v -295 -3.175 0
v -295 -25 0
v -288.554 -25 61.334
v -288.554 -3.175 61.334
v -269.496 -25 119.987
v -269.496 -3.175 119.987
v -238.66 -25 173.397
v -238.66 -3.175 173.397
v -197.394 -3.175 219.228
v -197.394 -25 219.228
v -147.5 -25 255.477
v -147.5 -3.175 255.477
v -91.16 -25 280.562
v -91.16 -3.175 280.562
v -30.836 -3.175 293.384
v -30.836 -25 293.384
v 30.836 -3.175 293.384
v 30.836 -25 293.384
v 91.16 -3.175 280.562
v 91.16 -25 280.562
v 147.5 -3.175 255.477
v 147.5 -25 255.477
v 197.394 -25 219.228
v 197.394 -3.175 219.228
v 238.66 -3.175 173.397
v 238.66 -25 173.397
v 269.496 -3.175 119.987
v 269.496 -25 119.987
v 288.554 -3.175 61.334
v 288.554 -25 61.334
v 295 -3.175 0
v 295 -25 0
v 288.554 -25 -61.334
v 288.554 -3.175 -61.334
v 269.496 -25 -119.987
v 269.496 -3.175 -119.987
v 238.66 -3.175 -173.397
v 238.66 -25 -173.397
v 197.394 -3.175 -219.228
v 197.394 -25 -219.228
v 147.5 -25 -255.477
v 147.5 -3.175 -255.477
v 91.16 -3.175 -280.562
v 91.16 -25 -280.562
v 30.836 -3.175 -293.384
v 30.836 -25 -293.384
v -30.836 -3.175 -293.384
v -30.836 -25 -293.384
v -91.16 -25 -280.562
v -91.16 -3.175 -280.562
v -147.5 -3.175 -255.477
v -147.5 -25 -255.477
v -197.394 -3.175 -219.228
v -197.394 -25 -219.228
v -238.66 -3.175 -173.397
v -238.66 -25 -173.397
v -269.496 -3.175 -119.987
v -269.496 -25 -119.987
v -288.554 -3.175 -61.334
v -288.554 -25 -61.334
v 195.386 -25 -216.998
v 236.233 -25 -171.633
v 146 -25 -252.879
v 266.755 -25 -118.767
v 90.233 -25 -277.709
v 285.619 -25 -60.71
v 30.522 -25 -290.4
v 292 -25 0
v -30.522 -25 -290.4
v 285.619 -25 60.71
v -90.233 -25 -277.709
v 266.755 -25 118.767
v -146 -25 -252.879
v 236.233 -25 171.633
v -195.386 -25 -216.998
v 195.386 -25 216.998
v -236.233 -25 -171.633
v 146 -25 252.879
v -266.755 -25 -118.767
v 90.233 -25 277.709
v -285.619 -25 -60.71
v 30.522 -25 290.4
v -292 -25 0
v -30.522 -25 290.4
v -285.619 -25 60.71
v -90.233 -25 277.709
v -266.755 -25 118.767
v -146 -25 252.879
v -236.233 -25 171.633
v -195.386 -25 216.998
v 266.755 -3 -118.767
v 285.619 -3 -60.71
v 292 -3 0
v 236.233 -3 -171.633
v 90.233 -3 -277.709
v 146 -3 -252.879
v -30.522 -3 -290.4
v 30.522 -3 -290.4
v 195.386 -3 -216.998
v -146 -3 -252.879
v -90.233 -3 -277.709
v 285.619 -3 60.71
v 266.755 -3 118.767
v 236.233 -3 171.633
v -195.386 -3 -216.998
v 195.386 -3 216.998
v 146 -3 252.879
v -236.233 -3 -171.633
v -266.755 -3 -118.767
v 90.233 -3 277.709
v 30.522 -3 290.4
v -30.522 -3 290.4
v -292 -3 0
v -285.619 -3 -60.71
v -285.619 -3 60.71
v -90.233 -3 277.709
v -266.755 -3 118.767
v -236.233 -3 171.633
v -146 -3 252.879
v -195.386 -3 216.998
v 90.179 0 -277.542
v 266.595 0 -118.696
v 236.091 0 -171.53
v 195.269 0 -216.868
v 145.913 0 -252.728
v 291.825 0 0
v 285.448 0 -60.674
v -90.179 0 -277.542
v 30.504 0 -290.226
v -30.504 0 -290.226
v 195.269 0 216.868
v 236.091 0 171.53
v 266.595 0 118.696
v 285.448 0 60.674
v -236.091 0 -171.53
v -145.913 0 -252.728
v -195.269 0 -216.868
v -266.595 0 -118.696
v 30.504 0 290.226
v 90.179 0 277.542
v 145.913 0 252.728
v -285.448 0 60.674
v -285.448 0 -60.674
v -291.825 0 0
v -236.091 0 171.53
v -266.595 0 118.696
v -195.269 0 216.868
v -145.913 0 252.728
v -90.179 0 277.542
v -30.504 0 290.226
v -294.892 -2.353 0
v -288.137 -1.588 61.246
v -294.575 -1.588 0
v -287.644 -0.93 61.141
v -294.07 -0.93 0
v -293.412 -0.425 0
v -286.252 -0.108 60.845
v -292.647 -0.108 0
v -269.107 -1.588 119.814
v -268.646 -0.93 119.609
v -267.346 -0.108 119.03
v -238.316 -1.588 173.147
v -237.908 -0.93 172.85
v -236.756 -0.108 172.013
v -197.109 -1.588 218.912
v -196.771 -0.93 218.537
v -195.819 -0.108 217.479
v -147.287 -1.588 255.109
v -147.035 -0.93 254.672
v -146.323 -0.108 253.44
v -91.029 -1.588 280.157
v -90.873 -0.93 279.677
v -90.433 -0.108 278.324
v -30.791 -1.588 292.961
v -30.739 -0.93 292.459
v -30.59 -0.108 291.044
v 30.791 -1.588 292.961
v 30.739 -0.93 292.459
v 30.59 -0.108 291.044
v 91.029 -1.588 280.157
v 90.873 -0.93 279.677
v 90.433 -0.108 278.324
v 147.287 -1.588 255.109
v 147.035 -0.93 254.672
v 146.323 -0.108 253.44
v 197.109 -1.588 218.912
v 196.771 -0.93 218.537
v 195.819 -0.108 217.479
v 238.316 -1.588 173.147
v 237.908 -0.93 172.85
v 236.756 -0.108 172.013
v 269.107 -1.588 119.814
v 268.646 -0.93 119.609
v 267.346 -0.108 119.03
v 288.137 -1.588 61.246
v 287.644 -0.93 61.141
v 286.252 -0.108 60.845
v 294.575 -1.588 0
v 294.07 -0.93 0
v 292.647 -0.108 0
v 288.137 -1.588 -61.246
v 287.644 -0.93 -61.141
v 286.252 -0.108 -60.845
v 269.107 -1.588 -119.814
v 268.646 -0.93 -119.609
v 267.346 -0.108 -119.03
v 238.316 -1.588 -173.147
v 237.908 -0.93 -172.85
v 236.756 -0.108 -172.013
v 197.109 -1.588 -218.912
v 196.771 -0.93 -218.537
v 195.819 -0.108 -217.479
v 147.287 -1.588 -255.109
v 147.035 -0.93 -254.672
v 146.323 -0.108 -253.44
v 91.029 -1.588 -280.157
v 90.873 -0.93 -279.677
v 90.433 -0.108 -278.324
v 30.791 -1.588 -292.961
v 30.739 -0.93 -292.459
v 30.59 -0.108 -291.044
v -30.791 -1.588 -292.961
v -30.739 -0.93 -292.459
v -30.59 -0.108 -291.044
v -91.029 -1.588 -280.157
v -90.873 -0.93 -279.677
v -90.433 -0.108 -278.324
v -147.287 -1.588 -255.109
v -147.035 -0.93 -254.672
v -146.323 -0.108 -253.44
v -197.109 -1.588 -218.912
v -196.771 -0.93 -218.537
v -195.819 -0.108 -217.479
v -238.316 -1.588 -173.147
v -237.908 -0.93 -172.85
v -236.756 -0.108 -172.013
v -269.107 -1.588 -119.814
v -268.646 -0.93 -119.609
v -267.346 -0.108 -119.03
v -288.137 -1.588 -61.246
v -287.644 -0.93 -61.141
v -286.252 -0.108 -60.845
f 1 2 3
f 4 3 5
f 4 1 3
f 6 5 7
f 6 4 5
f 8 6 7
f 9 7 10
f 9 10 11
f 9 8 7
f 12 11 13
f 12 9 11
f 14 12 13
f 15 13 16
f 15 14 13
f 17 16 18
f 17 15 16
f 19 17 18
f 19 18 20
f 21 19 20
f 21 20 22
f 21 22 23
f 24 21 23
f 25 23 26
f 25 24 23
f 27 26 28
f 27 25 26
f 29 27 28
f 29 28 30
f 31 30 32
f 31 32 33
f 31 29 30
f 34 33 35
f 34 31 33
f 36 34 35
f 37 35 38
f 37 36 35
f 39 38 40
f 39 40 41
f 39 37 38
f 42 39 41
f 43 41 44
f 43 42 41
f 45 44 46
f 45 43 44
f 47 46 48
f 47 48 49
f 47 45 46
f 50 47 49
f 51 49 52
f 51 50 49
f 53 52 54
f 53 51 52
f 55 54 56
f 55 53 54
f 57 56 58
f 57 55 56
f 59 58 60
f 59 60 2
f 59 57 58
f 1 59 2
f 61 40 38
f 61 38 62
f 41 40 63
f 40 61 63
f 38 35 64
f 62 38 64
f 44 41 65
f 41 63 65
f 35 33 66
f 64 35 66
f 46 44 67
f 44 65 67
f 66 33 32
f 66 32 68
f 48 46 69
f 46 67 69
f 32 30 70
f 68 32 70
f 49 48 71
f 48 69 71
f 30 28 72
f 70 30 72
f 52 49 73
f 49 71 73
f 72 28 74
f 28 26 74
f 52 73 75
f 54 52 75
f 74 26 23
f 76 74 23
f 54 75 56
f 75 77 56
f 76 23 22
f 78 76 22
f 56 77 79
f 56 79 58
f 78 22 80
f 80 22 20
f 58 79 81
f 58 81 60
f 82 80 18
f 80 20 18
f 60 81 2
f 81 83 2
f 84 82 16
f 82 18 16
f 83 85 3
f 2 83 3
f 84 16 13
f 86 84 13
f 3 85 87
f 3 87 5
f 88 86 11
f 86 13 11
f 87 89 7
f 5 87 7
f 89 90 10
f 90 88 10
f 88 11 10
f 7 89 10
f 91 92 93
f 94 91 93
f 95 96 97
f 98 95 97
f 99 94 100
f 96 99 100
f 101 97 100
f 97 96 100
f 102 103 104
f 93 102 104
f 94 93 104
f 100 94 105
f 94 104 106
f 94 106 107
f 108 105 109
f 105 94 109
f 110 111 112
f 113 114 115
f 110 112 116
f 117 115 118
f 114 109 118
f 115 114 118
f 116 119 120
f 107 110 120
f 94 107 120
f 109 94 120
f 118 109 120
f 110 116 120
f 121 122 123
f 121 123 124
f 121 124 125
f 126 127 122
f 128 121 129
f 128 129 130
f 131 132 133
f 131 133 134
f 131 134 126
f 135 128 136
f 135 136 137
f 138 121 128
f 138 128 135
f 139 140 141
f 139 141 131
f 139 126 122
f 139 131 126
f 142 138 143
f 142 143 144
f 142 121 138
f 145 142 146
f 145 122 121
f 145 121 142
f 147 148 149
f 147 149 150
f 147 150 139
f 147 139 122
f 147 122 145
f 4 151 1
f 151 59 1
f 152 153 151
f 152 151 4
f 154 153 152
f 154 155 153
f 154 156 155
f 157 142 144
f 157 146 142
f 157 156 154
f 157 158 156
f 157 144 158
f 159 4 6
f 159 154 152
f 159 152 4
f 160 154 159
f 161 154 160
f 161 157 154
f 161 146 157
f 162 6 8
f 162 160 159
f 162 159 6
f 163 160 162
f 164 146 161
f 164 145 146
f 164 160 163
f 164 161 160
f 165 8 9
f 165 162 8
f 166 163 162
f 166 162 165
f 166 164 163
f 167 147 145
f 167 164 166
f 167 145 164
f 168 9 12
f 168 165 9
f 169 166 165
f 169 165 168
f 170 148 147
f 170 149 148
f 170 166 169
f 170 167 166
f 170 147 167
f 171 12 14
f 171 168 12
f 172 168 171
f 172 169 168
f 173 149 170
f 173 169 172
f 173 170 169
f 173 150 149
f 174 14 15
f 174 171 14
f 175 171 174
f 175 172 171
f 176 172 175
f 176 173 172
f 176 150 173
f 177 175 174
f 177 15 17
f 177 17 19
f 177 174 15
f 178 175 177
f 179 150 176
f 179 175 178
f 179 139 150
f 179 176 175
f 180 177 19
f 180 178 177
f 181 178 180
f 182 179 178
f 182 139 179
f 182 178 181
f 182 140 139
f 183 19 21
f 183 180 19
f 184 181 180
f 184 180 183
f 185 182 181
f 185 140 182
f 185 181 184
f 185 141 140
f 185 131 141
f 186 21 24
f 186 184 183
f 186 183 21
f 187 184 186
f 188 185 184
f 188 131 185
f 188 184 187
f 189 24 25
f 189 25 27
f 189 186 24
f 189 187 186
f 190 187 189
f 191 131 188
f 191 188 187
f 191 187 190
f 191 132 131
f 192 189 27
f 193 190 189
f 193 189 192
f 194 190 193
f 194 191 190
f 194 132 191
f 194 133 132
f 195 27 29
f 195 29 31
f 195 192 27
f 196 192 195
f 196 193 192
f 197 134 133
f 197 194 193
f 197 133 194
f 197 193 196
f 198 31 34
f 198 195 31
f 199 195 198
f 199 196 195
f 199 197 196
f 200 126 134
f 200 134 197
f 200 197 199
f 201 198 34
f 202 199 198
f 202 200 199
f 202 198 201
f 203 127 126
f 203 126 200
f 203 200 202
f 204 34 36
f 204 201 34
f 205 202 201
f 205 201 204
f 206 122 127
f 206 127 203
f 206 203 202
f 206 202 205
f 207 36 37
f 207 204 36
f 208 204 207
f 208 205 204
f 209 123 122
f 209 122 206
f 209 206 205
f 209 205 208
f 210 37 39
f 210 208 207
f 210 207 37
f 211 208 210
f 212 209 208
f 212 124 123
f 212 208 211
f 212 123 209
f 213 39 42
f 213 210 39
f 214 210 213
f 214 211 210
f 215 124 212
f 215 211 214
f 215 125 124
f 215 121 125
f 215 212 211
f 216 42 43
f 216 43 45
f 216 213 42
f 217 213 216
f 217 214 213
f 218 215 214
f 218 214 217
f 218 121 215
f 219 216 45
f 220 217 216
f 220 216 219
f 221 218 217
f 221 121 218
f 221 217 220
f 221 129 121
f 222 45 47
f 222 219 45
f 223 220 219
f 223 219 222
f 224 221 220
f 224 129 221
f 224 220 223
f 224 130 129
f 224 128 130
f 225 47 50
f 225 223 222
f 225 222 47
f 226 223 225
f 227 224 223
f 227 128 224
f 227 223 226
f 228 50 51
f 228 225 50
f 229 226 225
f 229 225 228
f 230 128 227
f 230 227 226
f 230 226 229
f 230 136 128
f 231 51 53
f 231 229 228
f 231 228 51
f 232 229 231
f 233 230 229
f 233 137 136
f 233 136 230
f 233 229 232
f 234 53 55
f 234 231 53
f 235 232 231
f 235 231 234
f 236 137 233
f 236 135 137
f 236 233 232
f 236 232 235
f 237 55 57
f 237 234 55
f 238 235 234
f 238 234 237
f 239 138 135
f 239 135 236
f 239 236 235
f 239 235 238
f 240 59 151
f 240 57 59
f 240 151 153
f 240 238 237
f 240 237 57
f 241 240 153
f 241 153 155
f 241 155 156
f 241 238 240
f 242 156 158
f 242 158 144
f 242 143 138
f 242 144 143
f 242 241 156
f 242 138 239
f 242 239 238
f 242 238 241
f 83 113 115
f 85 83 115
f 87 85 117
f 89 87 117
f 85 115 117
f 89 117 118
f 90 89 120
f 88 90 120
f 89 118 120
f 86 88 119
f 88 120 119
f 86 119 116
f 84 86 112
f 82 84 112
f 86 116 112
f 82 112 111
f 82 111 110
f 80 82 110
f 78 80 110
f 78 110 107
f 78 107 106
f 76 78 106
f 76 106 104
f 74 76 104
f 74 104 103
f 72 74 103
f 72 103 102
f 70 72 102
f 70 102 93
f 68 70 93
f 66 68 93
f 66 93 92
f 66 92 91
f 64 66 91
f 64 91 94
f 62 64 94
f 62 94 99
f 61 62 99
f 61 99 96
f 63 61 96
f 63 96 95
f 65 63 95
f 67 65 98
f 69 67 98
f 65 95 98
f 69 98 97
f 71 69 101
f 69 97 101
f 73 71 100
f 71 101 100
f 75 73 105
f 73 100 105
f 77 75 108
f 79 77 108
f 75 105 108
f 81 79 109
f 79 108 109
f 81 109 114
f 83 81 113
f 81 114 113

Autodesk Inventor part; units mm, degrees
ref_plane "YZ Plane" through (0, 0, 0) normal (1, 0, 0) x (0, 1, 0)
ref_plane "XZ Plane" through (0, 0, 0) normal (0, 1, 0) x (-1, 0, 0)
ref_plane "XY Plane" through (0, 0, 0) normal (0, 0, 1) x (1, 0, 0)
sketch "Sketch1" plane through (0, 0, 0) normal (0, 1, 0) x (-1, 0, 0)
  circle A0 centre (0, 0) radius 295
  dimension "d0" = 590
extrude "Extrusion1" add sketch "Sketch1" against normal blind 25
shell "Shell1" thickness 3 removed faces 1 at (-85.1519, -25, 3.4761)
fillet "Fillet1" radius 3.175 1 edges at (295, 0, 0)
properties part number "still_cover"
